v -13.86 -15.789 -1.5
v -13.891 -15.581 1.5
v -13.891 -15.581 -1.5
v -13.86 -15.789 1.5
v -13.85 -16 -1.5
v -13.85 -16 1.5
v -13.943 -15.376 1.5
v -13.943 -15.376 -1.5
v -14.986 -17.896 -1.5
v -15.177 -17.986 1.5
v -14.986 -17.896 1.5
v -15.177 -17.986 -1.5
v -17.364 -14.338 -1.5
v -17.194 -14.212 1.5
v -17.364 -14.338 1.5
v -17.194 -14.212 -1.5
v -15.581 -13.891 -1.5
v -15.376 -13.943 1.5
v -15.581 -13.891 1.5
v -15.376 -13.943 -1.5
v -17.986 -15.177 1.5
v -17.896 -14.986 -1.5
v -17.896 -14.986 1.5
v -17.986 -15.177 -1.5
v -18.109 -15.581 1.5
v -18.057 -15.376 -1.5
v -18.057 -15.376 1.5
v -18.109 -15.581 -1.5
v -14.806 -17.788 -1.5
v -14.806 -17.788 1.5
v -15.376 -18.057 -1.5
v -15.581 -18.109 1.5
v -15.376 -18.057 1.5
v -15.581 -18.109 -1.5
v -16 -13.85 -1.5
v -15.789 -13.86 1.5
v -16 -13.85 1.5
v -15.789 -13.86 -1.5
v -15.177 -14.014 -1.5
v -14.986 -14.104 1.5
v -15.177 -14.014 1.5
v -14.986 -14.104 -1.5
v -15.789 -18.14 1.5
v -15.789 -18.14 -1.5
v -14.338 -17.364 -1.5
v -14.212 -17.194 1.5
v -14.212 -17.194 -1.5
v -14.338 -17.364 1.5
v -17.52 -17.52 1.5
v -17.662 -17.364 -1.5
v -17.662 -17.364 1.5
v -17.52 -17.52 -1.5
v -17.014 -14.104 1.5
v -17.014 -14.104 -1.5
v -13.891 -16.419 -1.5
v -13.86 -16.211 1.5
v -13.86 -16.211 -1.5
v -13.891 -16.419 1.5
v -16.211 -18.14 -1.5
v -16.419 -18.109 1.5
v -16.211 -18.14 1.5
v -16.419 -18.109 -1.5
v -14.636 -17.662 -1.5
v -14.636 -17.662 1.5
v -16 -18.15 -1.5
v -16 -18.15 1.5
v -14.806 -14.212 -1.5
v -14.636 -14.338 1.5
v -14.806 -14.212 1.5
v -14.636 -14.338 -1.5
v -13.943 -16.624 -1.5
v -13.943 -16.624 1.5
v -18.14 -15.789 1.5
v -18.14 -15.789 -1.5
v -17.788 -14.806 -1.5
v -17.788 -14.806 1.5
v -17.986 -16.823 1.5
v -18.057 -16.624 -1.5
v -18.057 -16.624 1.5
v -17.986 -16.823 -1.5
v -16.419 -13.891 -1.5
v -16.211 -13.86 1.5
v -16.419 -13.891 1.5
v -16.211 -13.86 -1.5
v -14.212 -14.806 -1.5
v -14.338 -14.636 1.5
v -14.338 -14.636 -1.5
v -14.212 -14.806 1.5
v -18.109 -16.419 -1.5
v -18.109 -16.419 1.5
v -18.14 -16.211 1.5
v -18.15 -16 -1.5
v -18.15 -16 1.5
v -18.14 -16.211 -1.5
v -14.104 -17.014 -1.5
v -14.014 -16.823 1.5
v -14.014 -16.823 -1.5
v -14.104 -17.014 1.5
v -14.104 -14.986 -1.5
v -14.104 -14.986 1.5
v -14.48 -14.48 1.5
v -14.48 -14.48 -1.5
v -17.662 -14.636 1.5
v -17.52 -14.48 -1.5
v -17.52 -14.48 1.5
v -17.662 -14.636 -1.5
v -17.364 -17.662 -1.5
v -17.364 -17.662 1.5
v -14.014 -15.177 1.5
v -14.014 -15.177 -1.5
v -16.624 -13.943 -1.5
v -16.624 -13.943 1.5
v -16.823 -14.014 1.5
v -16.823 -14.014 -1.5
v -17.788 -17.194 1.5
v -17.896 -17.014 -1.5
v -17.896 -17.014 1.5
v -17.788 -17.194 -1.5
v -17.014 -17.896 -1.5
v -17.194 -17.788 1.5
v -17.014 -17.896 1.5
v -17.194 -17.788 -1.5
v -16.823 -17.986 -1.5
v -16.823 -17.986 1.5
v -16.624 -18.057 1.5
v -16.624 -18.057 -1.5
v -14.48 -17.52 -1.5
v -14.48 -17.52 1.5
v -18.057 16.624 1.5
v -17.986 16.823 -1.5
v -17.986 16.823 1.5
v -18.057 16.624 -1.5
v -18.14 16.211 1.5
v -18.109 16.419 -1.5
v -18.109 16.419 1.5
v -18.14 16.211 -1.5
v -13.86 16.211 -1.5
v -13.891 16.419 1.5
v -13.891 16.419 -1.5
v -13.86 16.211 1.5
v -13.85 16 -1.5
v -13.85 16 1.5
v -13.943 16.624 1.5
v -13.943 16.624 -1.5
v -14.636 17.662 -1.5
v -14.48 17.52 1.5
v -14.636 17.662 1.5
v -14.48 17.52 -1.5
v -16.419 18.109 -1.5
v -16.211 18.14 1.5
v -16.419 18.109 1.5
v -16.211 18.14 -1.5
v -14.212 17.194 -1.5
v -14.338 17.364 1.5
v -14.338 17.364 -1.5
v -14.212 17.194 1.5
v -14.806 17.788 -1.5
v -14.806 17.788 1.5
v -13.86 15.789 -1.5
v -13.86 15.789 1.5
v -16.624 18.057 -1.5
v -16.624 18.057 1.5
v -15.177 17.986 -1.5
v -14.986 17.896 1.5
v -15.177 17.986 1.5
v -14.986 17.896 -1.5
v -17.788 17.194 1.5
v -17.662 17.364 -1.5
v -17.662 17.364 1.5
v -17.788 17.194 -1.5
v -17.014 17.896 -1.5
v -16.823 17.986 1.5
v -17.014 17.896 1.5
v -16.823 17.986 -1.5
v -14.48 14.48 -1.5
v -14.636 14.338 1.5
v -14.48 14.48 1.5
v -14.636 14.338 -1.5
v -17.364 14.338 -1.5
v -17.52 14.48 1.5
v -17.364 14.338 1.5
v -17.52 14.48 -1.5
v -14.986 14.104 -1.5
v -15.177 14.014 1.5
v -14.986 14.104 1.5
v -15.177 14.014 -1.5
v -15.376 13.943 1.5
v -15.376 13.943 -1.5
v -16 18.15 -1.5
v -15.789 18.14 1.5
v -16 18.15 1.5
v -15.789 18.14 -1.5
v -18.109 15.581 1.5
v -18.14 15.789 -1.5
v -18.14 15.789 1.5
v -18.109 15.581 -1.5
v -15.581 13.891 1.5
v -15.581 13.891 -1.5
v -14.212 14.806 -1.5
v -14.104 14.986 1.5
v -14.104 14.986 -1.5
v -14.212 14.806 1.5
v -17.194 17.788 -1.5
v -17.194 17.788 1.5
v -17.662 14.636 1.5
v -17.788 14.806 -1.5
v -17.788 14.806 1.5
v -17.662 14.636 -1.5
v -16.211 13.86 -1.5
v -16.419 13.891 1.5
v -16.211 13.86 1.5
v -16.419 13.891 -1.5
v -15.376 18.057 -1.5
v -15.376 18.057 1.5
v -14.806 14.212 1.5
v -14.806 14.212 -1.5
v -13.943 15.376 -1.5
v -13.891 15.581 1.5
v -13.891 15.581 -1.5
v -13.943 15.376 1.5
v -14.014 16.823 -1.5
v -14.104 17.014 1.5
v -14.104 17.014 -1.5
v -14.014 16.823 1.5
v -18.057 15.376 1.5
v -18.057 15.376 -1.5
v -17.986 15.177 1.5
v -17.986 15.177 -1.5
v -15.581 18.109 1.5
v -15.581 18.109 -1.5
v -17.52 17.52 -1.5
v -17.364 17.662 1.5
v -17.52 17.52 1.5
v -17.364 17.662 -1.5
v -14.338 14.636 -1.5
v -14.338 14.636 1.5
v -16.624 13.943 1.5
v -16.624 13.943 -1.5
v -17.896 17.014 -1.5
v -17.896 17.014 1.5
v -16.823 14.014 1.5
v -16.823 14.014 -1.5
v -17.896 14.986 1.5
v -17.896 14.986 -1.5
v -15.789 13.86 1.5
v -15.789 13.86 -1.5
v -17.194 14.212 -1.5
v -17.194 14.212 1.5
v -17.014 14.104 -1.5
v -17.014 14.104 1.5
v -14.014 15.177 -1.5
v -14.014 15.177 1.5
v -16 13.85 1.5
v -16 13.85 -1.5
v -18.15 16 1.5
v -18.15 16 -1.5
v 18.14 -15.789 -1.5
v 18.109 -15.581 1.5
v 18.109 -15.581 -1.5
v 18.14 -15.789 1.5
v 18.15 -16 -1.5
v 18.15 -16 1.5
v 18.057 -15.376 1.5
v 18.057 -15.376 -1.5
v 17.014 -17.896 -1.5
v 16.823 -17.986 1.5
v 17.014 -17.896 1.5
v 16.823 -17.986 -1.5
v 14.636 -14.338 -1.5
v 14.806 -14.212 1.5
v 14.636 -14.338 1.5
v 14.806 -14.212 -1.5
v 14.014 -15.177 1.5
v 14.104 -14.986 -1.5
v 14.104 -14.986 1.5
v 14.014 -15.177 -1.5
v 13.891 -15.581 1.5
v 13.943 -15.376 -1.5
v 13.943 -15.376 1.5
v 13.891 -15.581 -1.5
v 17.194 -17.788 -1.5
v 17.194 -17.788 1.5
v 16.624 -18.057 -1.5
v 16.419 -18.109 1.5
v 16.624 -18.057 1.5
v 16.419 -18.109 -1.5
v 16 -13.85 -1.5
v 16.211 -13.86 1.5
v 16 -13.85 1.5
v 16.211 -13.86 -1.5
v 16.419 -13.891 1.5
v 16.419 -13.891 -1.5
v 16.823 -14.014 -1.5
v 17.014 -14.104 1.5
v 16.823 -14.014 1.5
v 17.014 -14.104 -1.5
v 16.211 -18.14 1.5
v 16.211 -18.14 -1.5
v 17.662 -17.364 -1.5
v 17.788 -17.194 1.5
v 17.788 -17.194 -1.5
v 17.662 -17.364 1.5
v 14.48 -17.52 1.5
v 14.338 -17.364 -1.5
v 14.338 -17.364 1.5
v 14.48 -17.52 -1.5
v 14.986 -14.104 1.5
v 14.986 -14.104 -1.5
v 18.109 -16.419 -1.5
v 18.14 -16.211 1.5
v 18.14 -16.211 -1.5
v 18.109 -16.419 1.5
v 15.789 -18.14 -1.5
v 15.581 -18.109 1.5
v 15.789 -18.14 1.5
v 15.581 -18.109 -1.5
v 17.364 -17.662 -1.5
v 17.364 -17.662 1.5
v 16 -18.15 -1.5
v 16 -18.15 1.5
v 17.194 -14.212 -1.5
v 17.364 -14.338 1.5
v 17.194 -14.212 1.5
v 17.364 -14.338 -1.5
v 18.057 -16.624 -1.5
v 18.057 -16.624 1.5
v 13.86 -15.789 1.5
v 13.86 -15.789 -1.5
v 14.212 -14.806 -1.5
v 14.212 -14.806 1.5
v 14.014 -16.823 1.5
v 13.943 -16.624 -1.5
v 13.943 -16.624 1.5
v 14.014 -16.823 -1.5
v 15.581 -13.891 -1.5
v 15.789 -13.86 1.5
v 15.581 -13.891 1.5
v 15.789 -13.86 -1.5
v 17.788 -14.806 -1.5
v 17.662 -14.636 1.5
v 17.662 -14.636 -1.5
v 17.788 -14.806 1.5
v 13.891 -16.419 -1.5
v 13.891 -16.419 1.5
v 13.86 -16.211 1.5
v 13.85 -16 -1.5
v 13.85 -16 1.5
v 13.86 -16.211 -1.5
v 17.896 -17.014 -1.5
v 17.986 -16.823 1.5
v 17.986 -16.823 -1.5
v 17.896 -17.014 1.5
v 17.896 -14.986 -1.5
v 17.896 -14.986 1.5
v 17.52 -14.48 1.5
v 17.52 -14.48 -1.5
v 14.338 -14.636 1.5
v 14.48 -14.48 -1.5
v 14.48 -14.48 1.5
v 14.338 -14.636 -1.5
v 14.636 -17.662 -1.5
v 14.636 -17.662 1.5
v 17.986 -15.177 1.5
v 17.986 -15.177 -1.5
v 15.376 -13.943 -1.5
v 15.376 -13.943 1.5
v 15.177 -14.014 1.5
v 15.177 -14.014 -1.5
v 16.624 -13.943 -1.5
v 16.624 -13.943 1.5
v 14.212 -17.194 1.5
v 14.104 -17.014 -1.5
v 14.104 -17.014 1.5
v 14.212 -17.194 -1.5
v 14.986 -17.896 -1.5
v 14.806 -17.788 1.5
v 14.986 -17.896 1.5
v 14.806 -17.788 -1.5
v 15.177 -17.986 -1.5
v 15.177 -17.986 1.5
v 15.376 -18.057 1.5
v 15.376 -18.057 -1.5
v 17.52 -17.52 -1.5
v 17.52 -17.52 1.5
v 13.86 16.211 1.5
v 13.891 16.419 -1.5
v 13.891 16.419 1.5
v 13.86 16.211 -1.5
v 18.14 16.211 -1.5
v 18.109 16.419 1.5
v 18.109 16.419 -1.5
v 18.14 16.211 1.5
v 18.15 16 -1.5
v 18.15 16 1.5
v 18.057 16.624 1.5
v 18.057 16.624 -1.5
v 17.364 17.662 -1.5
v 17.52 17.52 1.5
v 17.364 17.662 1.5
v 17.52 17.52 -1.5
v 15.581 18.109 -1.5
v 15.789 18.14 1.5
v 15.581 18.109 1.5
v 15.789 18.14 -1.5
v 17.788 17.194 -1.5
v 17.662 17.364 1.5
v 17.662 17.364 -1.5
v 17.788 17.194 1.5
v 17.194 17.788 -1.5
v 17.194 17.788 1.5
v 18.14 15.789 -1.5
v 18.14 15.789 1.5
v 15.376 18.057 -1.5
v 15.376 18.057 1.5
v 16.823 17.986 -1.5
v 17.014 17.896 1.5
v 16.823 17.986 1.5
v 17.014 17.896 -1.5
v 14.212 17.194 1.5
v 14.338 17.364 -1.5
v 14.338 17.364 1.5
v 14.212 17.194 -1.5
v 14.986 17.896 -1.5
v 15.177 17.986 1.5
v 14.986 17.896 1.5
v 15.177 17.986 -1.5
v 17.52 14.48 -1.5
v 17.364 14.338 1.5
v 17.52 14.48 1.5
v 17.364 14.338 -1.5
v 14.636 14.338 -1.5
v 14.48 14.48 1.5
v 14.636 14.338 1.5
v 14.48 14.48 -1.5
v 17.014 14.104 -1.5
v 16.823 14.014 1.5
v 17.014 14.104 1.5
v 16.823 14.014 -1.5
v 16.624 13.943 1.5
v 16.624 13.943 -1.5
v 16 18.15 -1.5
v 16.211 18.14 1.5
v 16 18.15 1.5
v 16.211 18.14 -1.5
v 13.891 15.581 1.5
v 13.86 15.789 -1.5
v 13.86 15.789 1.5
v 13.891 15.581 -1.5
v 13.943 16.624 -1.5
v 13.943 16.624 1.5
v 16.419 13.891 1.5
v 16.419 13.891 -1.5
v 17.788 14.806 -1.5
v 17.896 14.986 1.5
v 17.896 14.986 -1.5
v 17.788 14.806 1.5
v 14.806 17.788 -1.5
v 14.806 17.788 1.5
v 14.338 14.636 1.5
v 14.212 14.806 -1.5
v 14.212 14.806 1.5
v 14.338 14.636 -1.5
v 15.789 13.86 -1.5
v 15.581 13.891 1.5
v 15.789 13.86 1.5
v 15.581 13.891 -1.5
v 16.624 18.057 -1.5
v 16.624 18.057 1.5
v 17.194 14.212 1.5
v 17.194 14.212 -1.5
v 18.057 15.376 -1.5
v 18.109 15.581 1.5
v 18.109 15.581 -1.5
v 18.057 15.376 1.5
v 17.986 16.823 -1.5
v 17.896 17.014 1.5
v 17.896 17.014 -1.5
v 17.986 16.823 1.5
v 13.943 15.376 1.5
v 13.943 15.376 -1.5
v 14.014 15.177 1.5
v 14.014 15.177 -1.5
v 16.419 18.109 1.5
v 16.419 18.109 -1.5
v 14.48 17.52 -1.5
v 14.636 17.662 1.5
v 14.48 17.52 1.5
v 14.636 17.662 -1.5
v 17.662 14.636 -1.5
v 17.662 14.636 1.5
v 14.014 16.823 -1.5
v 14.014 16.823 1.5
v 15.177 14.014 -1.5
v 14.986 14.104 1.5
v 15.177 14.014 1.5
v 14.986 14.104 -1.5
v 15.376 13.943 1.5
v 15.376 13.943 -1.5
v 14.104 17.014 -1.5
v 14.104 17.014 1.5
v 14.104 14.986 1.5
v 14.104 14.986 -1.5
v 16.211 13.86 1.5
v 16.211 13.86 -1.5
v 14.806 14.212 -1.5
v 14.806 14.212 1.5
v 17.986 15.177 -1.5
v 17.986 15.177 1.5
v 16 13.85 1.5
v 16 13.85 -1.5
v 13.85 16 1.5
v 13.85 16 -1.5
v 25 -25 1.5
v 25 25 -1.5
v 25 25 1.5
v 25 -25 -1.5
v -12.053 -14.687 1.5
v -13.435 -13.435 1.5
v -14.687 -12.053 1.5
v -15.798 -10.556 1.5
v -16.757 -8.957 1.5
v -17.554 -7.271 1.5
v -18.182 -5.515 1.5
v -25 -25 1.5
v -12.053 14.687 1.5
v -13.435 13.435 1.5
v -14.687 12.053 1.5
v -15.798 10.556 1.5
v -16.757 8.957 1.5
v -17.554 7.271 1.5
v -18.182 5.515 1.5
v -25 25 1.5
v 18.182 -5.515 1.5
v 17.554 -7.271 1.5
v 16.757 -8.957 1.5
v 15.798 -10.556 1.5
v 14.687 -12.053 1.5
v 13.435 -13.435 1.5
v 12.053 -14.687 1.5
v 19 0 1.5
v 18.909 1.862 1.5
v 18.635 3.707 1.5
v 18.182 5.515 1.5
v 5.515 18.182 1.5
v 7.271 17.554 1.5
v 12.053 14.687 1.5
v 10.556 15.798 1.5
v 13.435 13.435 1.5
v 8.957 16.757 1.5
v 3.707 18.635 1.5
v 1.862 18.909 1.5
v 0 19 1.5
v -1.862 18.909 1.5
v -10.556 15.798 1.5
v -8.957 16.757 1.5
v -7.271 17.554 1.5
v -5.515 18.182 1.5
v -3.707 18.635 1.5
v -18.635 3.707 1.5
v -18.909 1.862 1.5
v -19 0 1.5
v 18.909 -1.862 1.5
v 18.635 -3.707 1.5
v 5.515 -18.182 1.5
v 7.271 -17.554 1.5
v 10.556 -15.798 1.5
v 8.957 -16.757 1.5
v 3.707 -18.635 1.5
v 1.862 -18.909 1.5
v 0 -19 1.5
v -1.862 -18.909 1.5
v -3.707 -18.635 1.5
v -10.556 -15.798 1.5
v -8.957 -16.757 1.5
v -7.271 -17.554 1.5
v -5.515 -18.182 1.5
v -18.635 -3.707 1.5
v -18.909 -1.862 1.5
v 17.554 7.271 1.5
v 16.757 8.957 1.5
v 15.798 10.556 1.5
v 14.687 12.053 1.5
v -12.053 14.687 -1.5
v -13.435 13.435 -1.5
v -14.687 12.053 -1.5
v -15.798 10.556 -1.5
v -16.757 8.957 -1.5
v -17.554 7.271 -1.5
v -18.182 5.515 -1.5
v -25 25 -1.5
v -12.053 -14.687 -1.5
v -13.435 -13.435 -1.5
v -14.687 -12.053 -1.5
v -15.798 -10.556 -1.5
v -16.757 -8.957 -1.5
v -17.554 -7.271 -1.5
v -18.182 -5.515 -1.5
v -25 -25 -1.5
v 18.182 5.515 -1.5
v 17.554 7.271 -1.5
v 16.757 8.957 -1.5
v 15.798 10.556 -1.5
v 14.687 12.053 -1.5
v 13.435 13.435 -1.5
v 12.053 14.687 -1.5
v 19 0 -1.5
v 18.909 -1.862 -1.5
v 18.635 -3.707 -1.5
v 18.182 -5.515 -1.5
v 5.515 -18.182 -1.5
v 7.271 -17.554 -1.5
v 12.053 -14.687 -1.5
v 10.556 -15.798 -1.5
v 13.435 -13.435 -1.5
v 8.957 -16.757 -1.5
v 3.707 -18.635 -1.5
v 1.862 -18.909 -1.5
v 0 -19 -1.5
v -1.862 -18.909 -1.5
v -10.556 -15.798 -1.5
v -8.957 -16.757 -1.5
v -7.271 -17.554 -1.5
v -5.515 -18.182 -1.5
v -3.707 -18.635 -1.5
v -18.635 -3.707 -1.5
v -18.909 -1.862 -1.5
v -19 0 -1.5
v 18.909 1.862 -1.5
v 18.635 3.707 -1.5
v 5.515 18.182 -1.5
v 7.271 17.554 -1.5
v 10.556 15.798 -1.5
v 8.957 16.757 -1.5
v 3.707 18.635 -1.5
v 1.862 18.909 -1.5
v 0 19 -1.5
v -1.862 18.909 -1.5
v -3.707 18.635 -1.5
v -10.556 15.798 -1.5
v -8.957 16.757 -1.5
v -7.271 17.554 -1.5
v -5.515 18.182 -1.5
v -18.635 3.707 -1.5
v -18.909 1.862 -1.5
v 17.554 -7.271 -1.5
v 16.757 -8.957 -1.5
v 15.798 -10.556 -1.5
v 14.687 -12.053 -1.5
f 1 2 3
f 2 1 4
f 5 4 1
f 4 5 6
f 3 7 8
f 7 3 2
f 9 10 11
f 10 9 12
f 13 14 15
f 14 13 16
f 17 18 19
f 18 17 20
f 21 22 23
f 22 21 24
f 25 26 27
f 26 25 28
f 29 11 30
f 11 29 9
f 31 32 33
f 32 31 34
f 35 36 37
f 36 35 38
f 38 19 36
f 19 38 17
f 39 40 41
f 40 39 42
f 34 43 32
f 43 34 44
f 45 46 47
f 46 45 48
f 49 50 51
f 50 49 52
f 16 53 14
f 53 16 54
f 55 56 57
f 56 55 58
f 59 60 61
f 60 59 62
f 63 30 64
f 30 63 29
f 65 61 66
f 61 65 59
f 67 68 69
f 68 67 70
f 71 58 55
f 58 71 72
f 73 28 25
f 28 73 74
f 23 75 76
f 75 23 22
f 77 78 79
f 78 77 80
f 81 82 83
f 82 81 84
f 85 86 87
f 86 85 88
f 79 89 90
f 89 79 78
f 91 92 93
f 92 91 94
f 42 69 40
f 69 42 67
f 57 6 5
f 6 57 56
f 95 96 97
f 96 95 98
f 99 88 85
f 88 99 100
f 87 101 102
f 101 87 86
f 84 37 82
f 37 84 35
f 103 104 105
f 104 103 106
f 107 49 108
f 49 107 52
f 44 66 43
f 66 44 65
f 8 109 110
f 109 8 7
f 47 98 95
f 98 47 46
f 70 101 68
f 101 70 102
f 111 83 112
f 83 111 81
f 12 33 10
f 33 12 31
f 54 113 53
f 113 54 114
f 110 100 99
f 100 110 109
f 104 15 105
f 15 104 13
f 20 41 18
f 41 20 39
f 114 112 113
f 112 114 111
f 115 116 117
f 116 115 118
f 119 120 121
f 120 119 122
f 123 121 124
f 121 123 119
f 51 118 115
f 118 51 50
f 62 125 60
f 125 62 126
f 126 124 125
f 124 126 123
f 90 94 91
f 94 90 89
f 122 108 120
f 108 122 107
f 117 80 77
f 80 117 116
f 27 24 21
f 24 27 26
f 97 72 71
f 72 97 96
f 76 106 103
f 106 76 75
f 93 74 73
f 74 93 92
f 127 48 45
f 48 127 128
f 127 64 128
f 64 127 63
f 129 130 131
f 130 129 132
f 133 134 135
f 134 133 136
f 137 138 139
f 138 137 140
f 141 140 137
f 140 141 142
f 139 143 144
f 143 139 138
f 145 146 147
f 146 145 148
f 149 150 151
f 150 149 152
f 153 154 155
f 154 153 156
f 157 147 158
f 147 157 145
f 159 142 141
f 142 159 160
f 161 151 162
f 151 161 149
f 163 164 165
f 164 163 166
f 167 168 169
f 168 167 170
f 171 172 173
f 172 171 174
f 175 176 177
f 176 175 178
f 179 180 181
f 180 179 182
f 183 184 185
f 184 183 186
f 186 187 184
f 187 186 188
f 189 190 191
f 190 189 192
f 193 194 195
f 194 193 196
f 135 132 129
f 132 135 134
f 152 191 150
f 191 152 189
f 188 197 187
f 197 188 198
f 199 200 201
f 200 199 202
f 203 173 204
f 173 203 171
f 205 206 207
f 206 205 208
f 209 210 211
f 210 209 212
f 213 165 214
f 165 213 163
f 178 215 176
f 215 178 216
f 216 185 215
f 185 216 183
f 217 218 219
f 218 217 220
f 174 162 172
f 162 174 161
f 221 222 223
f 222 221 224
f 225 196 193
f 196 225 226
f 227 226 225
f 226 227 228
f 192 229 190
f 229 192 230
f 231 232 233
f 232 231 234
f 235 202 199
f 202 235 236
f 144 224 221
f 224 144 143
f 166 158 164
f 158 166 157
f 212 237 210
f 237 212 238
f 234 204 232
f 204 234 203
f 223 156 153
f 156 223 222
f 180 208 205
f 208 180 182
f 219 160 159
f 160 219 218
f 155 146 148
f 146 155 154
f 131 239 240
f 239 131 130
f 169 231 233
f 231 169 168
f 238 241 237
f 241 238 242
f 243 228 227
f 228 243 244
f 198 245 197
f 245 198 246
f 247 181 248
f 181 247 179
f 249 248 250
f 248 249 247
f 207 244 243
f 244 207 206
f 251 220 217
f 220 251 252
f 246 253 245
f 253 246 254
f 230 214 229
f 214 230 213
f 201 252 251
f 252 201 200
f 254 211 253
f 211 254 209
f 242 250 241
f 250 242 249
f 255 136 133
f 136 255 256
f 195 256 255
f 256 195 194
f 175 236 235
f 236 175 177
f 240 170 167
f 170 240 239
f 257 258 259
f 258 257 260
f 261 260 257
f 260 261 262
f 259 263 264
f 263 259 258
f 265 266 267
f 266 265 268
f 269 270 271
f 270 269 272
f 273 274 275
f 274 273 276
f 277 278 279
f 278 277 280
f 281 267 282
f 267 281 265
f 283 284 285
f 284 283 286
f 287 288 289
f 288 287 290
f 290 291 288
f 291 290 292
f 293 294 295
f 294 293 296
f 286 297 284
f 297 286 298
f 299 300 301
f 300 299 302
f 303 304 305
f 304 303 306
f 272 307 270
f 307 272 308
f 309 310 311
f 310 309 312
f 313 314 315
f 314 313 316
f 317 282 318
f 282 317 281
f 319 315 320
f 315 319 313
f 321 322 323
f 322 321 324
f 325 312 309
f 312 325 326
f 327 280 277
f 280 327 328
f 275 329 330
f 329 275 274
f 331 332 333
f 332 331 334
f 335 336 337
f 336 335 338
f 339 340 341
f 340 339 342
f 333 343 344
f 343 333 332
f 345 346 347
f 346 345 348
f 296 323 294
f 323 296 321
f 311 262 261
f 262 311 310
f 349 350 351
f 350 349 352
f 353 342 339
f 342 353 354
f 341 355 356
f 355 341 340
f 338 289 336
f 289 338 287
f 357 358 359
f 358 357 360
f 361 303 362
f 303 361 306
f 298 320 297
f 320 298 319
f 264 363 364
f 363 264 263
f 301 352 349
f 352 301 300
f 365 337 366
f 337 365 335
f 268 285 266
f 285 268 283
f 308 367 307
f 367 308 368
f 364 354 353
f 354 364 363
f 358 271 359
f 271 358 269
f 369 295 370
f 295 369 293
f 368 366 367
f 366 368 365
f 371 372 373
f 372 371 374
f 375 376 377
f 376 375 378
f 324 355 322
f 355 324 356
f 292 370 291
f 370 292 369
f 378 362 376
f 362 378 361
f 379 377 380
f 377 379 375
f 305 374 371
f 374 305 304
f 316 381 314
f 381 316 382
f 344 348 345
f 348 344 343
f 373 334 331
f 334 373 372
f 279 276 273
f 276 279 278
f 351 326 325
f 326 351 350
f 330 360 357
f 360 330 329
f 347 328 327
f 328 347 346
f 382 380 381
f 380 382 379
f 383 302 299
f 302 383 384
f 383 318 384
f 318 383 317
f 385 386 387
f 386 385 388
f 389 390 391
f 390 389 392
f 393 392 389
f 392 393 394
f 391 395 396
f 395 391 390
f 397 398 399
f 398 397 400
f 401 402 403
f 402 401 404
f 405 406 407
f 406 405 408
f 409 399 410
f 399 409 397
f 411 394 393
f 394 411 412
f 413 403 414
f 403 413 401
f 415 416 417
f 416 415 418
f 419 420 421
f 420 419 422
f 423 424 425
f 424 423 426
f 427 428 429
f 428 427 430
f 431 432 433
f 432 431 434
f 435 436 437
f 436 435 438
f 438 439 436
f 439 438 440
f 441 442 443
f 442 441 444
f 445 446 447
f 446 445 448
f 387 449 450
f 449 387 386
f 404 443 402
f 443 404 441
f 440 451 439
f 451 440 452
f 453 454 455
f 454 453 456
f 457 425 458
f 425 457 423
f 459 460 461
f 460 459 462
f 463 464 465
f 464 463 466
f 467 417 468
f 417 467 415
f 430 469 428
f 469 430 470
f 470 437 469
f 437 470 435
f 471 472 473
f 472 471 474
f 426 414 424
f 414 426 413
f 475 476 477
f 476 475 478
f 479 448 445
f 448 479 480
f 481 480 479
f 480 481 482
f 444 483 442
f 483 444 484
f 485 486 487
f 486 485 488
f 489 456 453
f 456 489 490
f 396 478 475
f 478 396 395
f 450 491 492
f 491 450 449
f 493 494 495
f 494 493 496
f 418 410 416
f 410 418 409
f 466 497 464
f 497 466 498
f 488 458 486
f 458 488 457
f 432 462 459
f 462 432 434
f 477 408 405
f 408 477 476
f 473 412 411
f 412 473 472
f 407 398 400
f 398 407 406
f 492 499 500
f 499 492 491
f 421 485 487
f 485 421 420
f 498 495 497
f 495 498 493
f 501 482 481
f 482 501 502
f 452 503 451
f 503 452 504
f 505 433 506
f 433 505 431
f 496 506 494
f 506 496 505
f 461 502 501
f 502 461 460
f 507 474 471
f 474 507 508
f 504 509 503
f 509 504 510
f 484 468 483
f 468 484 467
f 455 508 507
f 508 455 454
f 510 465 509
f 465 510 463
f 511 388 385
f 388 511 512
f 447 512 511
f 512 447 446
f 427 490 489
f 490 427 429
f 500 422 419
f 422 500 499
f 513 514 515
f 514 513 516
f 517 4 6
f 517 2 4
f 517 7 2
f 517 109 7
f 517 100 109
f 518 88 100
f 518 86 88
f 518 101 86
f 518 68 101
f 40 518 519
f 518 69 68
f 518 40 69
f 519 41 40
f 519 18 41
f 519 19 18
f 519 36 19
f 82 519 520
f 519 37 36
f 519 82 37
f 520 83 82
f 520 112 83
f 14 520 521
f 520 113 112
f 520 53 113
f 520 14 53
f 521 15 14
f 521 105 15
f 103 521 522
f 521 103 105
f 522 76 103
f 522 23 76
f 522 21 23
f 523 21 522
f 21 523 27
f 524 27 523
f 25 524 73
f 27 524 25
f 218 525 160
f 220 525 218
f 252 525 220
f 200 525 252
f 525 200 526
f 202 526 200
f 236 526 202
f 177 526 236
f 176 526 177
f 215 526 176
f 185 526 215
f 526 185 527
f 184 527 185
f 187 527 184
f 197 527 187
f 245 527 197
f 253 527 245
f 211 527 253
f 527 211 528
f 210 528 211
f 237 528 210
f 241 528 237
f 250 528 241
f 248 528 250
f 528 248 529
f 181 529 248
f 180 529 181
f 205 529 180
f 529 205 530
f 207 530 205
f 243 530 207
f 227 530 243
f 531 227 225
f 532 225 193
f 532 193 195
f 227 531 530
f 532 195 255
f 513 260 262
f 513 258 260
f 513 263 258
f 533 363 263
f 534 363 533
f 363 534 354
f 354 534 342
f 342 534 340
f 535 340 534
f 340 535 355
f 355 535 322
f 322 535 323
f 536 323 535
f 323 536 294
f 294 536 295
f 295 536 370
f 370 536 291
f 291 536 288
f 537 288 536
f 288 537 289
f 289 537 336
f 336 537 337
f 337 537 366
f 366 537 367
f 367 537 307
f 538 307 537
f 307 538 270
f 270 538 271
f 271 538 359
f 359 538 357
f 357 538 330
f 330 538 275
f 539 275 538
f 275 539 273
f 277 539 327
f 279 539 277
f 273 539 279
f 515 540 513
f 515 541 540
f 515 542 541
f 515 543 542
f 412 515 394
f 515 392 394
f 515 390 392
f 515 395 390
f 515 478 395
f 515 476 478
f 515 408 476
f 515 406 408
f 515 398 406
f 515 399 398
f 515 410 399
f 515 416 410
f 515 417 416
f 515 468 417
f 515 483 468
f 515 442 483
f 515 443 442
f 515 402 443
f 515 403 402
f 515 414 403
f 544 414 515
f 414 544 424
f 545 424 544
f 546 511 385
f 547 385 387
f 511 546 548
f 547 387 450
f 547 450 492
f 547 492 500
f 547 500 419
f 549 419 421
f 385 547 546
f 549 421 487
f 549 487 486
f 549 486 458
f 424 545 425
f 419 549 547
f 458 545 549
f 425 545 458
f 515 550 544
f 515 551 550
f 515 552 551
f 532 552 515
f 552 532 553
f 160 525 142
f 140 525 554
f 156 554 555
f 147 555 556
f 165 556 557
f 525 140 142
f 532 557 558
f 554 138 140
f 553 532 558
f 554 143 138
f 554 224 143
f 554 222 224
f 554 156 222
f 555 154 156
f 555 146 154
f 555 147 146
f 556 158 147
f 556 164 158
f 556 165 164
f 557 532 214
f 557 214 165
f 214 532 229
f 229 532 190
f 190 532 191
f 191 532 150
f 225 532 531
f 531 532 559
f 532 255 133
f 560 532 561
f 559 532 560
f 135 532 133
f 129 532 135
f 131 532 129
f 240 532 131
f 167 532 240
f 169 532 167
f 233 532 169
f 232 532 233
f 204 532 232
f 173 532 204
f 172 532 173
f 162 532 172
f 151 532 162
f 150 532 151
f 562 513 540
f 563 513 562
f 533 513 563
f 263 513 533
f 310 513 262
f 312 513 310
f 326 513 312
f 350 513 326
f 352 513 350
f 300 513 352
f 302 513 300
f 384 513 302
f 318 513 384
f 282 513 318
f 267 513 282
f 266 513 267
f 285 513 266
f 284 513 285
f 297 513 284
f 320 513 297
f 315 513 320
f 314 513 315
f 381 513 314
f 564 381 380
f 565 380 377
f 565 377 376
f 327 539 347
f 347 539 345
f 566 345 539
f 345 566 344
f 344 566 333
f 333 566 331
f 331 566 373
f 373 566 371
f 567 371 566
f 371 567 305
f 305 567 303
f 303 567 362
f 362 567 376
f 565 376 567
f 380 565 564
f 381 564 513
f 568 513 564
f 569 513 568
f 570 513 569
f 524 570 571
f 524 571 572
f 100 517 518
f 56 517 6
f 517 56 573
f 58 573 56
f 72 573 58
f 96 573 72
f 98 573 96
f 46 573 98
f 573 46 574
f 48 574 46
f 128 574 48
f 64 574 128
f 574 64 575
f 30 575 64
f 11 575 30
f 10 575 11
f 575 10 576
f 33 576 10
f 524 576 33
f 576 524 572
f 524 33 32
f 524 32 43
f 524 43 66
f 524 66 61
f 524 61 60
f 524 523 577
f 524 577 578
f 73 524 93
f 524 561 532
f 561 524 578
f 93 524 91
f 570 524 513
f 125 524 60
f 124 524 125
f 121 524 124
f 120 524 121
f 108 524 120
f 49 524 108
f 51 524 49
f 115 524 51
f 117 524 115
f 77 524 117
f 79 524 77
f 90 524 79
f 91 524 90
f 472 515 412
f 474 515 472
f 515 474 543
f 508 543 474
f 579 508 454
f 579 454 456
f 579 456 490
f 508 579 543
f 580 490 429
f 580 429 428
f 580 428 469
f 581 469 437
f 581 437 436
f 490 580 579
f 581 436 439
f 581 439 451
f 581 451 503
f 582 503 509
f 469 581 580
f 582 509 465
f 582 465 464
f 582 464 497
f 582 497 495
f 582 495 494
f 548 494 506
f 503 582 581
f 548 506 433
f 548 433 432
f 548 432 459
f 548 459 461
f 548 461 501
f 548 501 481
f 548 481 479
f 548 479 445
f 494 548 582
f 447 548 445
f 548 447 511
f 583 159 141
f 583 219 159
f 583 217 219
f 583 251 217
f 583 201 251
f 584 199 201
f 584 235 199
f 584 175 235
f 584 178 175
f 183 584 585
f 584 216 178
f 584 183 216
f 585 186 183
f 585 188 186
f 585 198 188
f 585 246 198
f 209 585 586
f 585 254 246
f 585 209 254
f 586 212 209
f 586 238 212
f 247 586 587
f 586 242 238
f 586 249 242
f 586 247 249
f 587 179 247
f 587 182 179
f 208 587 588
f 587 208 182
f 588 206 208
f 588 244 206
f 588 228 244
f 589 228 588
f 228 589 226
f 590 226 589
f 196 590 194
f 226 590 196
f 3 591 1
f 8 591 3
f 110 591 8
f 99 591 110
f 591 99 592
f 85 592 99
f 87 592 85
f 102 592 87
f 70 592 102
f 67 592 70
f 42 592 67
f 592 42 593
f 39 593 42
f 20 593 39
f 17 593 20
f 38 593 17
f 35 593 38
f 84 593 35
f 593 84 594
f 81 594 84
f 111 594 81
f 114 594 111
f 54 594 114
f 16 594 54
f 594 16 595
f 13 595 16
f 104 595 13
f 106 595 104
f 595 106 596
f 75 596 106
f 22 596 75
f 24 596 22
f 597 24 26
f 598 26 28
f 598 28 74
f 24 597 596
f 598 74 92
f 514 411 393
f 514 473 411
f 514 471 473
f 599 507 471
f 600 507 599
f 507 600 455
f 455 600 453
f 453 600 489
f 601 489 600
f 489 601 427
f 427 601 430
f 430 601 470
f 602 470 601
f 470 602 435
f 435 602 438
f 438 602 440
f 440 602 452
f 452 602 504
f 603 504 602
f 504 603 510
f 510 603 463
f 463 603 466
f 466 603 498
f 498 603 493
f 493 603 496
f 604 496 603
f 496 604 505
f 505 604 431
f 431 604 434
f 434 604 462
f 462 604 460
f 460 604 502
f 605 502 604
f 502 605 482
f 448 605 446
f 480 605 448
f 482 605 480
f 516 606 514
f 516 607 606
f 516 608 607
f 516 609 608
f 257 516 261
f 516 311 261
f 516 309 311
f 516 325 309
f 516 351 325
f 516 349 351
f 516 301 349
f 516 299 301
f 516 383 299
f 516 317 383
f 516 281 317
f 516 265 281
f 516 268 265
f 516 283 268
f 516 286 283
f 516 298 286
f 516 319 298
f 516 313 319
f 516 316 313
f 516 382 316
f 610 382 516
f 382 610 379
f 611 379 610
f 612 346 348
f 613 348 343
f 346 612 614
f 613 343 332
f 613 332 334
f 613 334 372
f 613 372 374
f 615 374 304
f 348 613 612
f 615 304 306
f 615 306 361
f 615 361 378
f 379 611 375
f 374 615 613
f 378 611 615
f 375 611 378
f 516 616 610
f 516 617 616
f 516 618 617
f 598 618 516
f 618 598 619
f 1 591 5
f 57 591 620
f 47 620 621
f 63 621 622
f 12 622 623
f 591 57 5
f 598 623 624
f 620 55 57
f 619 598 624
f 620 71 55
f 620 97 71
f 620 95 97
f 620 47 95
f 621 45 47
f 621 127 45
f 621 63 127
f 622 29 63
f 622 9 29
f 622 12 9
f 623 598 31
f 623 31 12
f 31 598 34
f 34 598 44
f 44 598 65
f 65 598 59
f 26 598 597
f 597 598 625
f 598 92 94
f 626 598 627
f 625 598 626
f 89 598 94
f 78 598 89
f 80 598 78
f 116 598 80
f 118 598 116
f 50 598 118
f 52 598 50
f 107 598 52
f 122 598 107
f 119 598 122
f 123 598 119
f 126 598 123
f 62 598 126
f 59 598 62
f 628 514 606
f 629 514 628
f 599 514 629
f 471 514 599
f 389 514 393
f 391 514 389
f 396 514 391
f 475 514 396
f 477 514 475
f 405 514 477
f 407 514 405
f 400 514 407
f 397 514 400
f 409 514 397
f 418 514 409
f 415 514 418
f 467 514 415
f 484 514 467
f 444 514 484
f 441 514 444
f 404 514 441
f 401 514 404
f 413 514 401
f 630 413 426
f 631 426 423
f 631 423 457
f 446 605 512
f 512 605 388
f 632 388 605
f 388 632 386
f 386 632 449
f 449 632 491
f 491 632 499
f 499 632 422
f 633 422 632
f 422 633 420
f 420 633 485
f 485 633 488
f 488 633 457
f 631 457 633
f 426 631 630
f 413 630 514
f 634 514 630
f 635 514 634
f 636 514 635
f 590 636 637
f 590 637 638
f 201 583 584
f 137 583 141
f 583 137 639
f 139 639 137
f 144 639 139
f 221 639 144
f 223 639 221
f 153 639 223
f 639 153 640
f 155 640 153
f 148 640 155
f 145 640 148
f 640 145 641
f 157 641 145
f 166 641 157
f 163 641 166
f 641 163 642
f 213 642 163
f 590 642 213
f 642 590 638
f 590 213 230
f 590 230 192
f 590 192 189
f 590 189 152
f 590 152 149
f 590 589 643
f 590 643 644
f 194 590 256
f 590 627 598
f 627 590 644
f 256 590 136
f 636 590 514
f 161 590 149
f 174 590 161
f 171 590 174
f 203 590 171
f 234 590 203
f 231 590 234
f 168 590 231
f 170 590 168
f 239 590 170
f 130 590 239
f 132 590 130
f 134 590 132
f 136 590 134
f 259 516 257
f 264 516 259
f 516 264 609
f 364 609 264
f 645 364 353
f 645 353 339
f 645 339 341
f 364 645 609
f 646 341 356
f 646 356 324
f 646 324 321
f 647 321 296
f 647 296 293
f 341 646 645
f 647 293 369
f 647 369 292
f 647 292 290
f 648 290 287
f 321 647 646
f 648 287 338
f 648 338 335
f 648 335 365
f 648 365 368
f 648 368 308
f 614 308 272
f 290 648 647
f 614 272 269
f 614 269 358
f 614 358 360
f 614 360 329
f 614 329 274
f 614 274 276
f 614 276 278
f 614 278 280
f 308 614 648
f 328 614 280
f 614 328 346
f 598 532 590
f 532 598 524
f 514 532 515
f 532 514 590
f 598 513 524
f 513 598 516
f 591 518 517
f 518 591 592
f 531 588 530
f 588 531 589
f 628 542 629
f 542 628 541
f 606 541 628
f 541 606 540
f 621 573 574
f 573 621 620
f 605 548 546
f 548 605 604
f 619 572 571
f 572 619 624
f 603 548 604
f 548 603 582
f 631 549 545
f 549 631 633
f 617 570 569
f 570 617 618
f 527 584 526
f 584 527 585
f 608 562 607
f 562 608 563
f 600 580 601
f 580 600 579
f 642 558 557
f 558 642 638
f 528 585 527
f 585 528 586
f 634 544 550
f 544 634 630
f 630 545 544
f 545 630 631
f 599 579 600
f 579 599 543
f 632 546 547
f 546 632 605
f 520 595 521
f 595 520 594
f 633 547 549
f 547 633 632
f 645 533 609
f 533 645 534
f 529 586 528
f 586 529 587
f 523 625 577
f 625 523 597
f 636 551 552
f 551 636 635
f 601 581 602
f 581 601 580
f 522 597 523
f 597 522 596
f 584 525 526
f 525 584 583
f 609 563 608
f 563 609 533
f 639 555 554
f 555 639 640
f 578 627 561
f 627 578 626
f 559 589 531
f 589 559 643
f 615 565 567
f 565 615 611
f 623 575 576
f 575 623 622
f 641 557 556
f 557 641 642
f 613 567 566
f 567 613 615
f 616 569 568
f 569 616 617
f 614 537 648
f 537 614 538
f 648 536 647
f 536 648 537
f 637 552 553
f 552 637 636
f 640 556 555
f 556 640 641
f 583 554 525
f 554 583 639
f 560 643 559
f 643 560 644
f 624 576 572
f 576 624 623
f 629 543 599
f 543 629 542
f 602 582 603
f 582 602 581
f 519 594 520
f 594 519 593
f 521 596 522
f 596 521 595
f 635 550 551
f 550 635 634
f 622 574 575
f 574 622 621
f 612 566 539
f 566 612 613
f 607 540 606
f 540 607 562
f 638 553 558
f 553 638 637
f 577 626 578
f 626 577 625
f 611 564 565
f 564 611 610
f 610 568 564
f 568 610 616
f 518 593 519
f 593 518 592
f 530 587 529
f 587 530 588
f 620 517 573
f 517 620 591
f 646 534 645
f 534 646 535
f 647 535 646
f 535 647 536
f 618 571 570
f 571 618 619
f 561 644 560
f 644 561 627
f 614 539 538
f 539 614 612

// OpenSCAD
$fn=64;

plate_size = 50;
plate_thickness = 3;

fan_size = 40;
fan_hole_spacing = 32;      // typical 40mm fan
corner_hole_d = 4.3;        // clearance for M4 (adjust as needed)

center_cutout_d = 38;       // airflow opening

difference() {
    // Mount plate
    cube([plate_size, plate_size, plate_thickness], center=true);

    // Center airflow cutout
    cylinder(h=plate_thickness + 2, d=center_cutout_d, center=true);

    // 4 corner mounting holes (fan pattern)
    for (x = [-fan_hole_spacing/2, fan_hole_spacing/2])
    for (y = [-fan_hole_spacing/2, fan_hole_spacing/2])
        translate([x, y, 0])
            cylinder(h=plate_thickness + 2, d=corner_hole_d, center=true);
}
